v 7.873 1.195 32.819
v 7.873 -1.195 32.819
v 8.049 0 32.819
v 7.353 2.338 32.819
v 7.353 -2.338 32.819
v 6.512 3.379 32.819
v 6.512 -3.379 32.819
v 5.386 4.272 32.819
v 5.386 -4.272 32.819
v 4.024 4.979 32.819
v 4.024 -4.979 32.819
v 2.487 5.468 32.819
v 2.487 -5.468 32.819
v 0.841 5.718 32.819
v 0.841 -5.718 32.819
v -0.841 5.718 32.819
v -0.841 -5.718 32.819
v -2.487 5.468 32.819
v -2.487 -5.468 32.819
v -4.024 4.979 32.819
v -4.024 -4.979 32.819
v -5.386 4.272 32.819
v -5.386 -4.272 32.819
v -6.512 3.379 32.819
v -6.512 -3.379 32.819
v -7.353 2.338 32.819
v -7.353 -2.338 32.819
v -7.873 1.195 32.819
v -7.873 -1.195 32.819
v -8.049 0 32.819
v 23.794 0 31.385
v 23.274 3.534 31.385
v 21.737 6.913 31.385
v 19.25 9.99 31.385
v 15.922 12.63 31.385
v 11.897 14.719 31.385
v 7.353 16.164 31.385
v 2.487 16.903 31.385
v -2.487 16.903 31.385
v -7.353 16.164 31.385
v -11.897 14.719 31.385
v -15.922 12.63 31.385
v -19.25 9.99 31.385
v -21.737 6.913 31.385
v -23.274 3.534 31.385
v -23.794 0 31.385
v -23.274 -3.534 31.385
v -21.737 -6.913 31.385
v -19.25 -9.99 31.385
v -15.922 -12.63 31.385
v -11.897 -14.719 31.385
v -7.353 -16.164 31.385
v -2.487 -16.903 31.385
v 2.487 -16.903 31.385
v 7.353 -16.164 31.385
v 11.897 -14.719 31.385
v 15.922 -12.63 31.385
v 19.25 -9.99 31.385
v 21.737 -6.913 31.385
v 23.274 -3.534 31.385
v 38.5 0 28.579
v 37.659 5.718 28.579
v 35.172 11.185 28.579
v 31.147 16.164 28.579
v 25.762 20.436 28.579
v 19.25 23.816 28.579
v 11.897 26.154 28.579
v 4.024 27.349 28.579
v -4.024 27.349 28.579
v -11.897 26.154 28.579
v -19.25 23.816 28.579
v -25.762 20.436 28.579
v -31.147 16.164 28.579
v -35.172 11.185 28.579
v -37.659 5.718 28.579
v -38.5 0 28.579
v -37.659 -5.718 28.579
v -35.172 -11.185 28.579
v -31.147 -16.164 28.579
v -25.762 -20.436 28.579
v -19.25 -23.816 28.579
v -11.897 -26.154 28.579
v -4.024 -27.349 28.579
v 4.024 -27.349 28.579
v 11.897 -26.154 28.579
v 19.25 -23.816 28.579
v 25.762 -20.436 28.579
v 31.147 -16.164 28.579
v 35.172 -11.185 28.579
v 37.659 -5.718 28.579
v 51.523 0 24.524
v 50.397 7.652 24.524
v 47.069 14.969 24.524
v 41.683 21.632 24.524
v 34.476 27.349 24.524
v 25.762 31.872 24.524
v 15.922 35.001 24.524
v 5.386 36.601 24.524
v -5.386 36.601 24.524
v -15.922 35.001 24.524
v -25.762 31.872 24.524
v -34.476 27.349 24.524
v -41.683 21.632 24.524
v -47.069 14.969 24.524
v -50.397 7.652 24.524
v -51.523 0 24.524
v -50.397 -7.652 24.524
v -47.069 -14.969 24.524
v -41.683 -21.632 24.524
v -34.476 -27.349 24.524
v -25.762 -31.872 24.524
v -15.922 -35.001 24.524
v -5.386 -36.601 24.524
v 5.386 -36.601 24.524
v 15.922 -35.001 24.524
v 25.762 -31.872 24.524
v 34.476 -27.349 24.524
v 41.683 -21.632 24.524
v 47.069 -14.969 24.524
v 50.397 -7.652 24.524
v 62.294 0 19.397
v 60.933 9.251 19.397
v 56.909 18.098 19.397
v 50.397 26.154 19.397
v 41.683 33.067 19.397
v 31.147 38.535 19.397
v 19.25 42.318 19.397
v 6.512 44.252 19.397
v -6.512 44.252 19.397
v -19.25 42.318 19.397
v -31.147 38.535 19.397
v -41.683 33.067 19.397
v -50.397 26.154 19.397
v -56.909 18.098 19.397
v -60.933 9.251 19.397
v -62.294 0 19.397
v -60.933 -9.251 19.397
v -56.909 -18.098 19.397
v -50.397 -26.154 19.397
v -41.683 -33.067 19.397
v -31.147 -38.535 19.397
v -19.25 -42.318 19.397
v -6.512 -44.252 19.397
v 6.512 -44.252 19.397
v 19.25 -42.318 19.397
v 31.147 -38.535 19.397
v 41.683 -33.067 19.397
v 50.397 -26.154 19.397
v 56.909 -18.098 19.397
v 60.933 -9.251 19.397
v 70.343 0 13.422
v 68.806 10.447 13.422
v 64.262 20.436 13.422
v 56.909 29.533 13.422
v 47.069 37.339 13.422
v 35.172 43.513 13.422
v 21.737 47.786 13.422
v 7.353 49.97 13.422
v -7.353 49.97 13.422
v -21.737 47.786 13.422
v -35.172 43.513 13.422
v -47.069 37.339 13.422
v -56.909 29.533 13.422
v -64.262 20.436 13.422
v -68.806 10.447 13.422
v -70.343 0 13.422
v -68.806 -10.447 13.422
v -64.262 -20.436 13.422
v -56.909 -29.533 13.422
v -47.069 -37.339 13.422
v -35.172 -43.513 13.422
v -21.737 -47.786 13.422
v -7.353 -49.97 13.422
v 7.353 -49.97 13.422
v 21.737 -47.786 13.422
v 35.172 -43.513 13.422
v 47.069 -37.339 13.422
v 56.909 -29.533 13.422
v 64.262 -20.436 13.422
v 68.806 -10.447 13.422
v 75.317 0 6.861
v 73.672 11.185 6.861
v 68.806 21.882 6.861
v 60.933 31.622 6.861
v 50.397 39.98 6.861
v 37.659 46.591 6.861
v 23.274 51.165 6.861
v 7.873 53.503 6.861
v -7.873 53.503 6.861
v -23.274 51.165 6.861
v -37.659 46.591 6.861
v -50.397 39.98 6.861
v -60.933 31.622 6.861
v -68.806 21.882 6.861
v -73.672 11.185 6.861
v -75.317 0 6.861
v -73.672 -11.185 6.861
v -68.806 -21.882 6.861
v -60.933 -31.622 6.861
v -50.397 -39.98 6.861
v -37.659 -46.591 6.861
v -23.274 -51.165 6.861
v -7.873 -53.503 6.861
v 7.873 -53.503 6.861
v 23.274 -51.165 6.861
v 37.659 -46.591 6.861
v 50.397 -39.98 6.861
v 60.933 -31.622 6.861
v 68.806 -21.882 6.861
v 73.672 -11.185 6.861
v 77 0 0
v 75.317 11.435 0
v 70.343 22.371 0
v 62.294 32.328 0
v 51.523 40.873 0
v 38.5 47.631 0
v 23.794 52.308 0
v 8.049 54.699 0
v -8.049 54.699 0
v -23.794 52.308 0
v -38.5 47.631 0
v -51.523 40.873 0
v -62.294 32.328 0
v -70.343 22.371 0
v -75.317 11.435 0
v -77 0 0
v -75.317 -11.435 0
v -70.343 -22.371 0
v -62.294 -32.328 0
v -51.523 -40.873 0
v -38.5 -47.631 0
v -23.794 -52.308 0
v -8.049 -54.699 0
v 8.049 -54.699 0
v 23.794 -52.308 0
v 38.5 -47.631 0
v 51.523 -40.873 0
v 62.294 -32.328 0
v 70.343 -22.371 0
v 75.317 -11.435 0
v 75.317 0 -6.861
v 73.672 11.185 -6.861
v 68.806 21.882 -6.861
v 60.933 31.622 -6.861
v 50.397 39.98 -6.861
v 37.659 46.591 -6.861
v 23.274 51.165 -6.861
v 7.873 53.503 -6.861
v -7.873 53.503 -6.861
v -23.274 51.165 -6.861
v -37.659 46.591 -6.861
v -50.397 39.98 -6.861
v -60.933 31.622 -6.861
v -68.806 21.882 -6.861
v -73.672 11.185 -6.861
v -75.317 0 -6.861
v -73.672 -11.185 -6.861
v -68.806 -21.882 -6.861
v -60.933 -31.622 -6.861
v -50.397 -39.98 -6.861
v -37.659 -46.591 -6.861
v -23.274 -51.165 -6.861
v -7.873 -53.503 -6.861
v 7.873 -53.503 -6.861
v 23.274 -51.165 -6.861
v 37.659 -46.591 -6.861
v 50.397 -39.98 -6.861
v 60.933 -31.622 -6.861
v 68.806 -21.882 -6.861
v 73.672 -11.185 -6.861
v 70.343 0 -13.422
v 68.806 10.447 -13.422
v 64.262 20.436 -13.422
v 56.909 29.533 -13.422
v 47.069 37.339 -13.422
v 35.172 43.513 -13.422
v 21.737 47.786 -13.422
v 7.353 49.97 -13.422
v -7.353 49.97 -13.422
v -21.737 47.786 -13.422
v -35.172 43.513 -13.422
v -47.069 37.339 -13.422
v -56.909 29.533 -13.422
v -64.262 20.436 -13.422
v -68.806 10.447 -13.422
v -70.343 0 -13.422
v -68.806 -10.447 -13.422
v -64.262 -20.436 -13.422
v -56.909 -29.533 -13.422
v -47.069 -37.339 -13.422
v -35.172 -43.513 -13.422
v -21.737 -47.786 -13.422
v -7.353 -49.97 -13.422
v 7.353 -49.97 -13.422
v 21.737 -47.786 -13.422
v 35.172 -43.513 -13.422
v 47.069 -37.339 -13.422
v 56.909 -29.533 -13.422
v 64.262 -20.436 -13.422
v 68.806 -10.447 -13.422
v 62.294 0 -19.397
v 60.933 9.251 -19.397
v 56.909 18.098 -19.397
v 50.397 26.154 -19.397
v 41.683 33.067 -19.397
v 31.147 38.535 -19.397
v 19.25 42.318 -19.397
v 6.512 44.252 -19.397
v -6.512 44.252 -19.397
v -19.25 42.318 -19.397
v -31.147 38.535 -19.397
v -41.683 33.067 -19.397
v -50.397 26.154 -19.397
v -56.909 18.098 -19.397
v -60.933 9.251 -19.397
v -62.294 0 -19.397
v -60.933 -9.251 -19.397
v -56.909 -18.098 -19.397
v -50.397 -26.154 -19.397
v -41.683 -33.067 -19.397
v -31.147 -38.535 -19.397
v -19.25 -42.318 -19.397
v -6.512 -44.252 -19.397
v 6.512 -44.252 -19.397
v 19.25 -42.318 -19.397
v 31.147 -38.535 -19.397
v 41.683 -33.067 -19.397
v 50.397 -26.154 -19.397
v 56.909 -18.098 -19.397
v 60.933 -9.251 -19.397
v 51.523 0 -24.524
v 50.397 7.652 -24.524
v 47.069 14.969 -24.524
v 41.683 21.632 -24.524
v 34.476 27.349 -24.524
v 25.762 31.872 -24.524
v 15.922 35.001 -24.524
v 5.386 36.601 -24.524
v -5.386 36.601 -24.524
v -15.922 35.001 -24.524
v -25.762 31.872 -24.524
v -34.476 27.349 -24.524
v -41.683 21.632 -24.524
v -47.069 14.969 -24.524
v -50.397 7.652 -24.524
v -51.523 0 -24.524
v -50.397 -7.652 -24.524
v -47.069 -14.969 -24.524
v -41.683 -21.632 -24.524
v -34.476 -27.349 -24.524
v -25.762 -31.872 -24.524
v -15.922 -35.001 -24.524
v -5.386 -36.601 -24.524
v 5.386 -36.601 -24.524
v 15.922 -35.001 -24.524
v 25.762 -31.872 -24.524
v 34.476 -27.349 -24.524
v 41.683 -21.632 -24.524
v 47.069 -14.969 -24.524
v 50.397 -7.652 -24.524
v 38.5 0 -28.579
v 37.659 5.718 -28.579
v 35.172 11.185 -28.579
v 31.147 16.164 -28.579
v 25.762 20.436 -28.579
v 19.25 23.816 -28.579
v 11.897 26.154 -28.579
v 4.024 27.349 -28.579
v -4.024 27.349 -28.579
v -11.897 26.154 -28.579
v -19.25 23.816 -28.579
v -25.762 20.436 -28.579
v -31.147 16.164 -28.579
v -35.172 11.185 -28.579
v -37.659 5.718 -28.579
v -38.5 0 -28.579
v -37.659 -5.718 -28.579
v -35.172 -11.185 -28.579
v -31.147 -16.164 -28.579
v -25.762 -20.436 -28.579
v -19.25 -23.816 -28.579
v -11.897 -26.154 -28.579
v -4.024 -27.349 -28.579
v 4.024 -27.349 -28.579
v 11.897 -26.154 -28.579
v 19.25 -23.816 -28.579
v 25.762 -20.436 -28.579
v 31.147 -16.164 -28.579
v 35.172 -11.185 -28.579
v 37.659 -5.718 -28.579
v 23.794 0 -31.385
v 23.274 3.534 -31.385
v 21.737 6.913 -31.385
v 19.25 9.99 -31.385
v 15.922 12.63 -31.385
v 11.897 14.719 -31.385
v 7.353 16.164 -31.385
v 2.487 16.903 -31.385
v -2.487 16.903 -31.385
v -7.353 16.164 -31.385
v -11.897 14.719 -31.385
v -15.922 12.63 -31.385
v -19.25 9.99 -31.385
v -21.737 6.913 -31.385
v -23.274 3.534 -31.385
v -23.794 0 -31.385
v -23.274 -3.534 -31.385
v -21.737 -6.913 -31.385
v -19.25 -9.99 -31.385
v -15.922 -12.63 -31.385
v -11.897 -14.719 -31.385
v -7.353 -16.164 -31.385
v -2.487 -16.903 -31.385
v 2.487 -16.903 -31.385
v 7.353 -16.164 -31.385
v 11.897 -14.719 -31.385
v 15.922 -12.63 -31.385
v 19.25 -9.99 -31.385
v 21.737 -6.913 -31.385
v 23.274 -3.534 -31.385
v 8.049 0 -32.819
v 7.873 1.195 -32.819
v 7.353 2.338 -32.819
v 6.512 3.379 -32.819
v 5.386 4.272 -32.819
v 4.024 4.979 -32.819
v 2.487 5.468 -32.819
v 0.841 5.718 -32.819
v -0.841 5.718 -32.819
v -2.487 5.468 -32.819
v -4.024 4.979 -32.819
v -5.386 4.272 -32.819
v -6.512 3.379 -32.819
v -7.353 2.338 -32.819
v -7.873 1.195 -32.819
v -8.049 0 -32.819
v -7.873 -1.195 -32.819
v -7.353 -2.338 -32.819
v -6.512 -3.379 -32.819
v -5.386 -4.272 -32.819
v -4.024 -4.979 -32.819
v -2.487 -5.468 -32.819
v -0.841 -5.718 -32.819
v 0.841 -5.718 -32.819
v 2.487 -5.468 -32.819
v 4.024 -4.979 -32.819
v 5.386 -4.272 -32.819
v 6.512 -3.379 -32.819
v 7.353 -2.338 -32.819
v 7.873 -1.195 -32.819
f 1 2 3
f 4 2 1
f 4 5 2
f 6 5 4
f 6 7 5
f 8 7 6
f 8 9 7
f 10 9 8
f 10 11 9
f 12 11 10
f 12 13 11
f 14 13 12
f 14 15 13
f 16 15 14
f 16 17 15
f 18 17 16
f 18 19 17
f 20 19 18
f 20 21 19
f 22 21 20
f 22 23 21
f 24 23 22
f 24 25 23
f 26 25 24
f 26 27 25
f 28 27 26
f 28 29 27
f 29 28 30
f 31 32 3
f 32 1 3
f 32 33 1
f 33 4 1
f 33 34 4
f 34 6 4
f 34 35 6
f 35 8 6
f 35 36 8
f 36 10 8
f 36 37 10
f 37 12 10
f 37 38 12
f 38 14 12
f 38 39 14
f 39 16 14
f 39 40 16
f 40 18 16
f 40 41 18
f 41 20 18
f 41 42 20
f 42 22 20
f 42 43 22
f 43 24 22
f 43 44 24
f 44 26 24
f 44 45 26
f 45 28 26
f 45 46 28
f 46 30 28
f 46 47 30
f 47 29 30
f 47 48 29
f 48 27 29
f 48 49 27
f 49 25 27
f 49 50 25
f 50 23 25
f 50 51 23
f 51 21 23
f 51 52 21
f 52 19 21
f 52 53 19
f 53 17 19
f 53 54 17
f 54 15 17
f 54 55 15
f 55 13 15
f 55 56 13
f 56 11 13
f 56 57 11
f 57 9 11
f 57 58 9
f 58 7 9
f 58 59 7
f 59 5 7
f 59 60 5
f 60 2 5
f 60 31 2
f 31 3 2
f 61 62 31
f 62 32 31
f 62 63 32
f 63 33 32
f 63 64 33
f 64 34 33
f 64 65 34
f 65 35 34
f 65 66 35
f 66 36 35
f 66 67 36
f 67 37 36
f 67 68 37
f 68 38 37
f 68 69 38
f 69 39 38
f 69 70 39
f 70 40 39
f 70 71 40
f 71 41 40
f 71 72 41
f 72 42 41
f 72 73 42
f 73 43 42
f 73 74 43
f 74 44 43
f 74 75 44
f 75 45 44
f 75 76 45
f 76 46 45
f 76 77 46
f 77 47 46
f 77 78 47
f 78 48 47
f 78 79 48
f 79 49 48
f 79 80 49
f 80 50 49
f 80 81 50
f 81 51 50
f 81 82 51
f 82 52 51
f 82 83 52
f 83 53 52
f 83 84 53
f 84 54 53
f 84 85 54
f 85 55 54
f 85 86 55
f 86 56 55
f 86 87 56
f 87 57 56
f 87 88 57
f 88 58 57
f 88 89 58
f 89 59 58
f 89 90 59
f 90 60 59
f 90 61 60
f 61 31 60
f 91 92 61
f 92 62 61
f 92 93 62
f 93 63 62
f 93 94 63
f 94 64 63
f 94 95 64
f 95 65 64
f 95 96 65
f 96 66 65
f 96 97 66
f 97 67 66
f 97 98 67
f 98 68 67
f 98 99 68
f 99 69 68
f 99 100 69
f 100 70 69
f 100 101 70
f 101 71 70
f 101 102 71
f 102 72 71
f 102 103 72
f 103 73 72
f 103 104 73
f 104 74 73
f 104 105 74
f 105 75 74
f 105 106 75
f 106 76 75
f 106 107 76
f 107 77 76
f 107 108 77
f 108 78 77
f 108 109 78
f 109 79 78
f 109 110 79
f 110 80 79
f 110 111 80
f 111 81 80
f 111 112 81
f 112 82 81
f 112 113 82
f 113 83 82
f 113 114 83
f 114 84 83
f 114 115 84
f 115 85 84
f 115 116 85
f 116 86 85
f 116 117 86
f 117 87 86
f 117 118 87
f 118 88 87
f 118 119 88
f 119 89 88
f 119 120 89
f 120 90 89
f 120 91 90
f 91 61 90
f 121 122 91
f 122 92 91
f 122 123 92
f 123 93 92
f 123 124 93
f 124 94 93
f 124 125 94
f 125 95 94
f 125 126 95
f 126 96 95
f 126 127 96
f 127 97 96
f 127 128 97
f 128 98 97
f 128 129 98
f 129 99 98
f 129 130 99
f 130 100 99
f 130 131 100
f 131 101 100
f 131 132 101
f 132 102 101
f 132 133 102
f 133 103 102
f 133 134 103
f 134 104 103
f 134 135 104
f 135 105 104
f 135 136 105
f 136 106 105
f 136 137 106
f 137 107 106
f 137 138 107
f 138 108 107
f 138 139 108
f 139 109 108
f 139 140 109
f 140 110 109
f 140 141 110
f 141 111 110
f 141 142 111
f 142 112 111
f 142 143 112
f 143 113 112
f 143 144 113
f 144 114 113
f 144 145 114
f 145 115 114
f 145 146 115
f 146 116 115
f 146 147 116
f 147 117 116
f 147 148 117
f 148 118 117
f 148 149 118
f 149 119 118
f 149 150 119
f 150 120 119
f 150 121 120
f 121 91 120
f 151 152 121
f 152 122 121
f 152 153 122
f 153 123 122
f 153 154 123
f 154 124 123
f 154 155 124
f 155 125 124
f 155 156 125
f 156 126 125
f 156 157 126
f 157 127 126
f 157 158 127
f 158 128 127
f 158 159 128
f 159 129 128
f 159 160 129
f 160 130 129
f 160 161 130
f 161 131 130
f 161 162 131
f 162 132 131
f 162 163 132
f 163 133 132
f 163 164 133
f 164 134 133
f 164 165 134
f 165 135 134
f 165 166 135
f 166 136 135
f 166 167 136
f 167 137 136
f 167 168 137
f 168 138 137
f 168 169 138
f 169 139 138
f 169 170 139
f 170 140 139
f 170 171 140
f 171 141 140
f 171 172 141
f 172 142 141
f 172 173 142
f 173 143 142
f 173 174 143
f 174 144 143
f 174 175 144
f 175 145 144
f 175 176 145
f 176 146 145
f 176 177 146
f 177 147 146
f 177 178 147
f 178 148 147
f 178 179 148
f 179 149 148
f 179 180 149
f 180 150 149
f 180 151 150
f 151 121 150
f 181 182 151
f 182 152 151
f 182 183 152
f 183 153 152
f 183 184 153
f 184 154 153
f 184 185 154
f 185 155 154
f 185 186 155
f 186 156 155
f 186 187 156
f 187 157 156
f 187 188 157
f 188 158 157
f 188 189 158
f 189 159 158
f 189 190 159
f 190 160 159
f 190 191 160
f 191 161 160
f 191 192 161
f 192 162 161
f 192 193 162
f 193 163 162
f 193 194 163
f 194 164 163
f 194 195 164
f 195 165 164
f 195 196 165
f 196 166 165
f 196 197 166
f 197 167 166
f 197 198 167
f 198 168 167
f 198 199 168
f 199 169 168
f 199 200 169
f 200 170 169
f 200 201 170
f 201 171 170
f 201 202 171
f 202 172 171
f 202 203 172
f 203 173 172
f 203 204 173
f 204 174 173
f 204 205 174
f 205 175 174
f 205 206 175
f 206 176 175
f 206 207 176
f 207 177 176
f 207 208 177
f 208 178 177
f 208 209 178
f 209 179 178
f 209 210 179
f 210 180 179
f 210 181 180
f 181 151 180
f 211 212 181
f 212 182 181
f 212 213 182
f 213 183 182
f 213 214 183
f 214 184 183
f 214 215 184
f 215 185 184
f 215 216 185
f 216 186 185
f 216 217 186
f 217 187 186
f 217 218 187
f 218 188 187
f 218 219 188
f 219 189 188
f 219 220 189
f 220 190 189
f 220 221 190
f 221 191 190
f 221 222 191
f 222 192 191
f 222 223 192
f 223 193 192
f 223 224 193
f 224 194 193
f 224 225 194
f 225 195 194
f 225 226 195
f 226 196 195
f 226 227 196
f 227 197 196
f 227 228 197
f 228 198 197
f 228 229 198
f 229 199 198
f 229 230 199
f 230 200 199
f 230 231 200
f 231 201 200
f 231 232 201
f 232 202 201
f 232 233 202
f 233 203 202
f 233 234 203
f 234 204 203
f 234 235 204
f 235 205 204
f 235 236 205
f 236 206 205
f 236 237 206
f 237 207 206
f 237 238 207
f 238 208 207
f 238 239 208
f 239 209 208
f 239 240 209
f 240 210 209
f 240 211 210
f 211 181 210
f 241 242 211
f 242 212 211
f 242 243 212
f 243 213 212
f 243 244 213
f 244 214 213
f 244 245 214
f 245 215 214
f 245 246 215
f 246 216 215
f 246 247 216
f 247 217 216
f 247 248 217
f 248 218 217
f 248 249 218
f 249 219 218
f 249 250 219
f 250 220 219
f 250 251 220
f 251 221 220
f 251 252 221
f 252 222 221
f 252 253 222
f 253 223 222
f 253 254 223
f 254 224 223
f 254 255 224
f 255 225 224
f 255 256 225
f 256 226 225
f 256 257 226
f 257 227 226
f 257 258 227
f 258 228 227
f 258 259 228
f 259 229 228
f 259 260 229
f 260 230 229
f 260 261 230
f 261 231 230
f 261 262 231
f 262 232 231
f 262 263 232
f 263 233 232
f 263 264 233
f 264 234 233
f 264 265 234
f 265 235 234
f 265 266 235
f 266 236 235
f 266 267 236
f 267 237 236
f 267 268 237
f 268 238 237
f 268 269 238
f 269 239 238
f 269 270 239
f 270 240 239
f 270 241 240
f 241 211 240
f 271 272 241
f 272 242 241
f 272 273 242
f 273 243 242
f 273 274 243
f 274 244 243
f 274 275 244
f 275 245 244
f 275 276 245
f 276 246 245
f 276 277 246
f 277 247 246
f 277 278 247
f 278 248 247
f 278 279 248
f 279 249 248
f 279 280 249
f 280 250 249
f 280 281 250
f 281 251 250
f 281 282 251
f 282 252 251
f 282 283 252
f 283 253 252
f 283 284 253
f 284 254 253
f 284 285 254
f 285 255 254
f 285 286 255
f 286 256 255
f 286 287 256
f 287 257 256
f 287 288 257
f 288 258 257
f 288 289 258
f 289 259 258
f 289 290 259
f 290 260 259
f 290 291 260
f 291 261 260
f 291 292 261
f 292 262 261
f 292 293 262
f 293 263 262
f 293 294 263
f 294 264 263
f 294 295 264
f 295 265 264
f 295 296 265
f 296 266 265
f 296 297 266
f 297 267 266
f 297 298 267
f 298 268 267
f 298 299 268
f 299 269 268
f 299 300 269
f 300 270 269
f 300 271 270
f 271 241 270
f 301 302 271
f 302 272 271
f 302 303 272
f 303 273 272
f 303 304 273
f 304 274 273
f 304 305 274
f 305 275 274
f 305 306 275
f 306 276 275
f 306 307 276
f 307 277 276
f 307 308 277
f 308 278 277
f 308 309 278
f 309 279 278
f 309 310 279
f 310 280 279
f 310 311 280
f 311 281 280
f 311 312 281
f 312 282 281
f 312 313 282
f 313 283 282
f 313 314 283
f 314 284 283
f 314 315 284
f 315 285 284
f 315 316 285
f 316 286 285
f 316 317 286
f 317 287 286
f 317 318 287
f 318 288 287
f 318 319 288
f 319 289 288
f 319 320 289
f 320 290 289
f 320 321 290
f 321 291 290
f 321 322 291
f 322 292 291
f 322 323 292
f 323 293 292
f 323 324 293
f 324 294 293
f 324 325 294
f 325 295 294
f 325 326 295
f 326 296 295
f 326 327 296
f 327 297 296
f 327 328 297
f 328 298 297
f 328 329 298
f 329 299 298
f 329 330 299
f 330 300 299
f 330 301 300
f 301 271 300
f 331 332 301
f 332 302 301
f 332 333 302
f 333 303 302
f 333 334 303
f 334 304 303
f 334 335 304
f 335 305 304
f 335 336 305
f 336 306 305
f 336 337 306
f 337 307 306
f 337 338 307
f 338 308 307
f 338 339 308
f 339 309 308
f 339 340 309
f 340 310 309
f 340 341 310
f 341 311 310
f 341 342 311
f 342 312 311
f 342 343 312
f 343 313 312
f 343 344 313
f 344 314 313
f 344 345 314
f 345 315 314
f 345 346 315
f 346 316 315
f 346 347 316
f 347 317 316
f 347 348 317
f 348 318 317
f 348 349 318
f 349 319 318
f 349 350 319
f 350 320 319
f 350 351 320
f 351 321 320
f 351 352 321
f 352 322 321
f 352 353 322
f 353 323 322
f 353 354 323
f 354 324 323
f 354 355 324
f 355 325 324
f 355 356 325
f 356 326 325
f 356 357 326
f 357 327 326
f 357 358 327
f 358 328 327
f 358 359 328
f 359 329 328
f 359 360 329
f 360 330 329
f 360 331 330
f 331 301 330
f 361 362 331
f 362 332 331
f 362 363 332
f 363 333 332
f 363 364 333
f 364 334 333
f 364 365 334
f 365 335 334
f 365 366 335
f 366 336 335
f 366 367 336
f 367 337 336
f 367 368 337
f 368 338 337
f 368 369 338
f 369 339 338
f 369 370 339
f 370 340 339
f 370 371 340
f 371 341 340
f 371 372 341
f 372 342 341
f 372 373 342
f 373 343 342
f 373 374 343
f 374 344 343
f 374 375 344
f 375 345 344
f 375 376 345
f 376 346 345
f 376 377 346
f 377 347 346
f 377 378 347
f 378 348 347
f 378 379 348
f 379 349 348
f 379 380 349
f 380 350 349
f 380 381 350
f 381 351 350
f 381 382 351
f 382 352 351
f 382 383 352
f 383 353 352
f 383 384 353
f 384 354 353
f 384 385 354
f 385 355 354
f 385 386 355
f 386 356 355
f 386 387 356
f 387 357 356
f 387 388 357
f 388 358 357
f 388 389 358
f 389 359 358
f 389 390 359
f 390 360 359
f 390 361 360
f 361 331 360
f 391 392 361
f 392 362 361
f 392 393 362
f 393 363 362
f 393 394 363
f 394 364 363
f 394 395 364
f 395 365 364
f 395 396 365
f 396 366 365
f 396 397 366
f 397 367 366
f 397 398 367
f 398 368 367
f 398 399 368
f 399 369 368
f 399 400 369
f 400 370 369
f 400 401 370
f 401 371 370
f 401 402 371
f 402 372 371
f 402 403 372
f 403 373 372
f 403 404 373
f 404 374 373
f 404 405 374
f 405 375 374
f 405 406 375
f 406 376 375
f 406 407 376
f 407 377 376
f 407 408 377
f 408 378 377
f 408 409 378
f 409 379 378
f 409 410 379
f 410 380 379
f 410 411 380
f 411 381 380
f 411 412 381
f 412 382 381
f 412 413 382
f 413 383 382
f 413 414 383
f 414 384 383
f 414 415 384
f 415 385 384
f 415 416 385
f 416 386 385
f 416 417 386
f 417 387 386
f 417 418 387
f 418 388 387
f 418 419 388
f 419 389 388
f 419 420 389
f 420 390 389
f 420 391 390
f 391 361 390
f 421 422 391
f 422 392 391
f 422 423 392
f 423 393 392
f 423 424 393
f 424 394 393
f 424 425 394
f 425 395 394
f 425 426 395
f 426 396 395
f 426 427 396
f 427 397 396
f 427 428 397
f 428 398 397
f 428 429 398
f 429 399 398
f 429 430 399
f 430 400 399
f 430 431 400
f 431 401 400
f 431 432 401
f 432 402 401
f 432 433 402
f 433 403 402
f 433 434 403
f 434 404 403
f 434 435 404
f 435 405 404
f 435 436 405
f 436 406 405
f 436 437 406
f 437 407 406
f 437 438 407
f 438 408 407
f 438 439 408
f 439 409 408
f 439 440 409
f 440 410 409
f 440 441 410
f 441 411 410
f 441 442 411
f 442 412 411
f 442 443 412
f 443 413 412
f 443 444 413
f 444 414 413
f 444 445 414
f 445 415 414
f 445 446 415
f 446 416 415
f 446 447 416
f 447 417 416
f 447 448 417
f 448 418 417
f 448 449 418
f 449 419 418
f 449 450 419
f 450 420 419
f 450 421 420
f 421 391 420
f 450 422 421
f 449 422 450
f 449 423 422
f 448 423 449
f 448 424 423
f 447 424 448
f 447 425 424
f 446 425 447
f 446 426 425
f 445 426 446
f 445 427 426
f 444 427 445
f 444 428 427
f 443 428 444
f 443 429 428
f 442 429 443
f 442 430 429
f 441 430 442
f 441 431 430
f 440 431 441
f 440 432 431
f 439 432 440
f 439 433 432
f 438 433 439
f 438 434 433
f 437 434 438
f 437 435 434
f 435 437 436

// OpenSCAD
// Generated by SolidPython 1.0.1 on 2020-07-29 00:46:47


scale(v = [7, 5, 3]) {
	sphere(r = 11);
}
/***********************************************
*********      SolidPython code:      **********
************************************************
 
# import packages: SolidPython
from solid import *
from solid.utils import *
from itertools import chain, combinations, permutations


class Resize:

    def __init__(self, scad_file):
        self.scad_file = scad_file
        #self.scad_file = import_scad(scad_file)
        # cone/cylinder param:
        self.r1 = 0
        self.r2 = 0
        self.h = 0
        # rectangular prism param:
        self.w = 0
        self.l = 0
        # ellipse param:
        self.r = 0

    # import OpenScad code (file name corresponds to shape)


    # classify shape + parameters
    def assign(self, param1, param2, param3):
        if self.scad_file == 'cone.scad':
            self.r1 = param1
            self.r2 = param2
            self.h = param3
        elif self.scad_file == 'cylinder.scad':
            self.r1 = param1
            self.r2 = param2
            self.h = param3
        elif self.scad_file == 'rectangularPrism.scad':
            self.h = param1
            self.l = param2
            self.w = param3
        else:
            self.r = param1
            self.h = param2

    # resize parameters
    def iterate(self):
        x = range(3, 20, 2)
        i = 1
        if self.scad_file == 'cone.scad':
            tempList = list(permutations(x, 2))
            for temp in tempList:
                param1 = temp[0]
                param2 = temp[1]
                filepath = 'produced_scad_files/' + 'cone' + str(param1) + '_' + str(param2) + '_' + '.scad'
                scad_render_to_file(cylinder(h=param1, r1=param2, r2=0), filepath)

        elif self.scad_file == 'cylinder.scad':
            tempList = list(permutations(x, 3))
            for temp in tempList:
                param1 = temp[0]
                param2 = temp[1]
                filepath = 'produced_scad_files/' + 'cylinder' + str(param1) + '_' + str(param2) + '_' + '.scad'
                scad_render_to_file(cylinder(h=param1, r1=param2, r2=param2), filepath)

        elif self.scad_file == 'rectangularPrism.scad':
            tempList = list(permutations(x, 3))
            for temp in tempList:
                param1 = temp[0]
                param2 = temp[1]
                param3 = temp[2]
                filepath = 'produced_scad_files/' + 'rectangularPrism' + str(param1) + '_' + str(param2) + '_' + str(
                    param3) + '.scad'
                scad_render_to_file(cube(size=(param1, param2, param3)), filepath)

        elif self.scad_file == 'ellipse.scad':
            tempList = list(permutations(x, 4))
            for temp in tempList:
                param1 = temp[0]
                param2 = temp[1]
                param3 = temp[2]
                param4 = temp[3]
                filepath = 'produced_scad_files/' + 'ellipse' + str(param1) + '_' + str(param2) + '_' + str(param3) + '_' + str(param4) + '.scad'
                scad_render_to_file(scale([param1, param2, param3])(sphere(r=param4)), filepath)

    def render_to_scadfile(self):
        scad_render_to_file(scad, 'example.scad') 
 
************************************************/
